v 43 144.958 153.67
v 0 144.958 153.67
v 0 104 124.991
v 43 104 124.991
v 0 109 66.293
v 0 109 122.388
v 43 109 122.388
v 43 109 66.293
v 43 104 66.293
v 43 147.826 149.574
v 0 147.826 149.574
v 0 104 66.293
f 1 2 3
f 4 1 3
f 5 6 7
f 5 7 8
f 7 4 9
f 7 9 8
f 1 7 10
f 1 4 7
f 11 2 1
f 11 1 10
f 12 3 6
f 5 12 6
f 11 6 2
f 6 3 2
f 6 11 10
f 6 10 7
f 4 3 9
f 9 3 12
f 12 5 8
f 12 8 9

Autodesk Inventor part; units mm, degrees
ref_plane "YZ Plane" through (0, 0, 0) normal (1, 0, 0) x (0, 1, 0)
ref_plane "XZ Plane" through (0, 0, 0) normal (0, 1, 0) x (-1, 0, 0)
ref_plane "XY Plane" through (0, 0, 0) normal (0, 0, 1) x (1, 0, 0)
sketch "Sketch1" plane through (0, 0, 0) normal (1, 0, 0) x (0, 1, 0)
  line L0 (104, 124.9907) -> (104, 66.293)
  line L1 (239.8243, 220.0959) -> (104, 124.9907)
  line L2 (227.1683, 205.1302) -> (109, 122.3878)
  line L3 (109, 122.3878) -> (109, 66.293)
  line L4 (144.9576, 153.6695) -> (147.8255, 149.5737)
  line L5 (109, 66.293) -> (104, 66.293)
  point P0 (0, 0)
  dimension "d2" = 58.6977
  dimension "d3" = 50
extrude "Extrusion1" add sketch "Sketch1" along normal blind 43
properties part number "shooter bracket without motor"
